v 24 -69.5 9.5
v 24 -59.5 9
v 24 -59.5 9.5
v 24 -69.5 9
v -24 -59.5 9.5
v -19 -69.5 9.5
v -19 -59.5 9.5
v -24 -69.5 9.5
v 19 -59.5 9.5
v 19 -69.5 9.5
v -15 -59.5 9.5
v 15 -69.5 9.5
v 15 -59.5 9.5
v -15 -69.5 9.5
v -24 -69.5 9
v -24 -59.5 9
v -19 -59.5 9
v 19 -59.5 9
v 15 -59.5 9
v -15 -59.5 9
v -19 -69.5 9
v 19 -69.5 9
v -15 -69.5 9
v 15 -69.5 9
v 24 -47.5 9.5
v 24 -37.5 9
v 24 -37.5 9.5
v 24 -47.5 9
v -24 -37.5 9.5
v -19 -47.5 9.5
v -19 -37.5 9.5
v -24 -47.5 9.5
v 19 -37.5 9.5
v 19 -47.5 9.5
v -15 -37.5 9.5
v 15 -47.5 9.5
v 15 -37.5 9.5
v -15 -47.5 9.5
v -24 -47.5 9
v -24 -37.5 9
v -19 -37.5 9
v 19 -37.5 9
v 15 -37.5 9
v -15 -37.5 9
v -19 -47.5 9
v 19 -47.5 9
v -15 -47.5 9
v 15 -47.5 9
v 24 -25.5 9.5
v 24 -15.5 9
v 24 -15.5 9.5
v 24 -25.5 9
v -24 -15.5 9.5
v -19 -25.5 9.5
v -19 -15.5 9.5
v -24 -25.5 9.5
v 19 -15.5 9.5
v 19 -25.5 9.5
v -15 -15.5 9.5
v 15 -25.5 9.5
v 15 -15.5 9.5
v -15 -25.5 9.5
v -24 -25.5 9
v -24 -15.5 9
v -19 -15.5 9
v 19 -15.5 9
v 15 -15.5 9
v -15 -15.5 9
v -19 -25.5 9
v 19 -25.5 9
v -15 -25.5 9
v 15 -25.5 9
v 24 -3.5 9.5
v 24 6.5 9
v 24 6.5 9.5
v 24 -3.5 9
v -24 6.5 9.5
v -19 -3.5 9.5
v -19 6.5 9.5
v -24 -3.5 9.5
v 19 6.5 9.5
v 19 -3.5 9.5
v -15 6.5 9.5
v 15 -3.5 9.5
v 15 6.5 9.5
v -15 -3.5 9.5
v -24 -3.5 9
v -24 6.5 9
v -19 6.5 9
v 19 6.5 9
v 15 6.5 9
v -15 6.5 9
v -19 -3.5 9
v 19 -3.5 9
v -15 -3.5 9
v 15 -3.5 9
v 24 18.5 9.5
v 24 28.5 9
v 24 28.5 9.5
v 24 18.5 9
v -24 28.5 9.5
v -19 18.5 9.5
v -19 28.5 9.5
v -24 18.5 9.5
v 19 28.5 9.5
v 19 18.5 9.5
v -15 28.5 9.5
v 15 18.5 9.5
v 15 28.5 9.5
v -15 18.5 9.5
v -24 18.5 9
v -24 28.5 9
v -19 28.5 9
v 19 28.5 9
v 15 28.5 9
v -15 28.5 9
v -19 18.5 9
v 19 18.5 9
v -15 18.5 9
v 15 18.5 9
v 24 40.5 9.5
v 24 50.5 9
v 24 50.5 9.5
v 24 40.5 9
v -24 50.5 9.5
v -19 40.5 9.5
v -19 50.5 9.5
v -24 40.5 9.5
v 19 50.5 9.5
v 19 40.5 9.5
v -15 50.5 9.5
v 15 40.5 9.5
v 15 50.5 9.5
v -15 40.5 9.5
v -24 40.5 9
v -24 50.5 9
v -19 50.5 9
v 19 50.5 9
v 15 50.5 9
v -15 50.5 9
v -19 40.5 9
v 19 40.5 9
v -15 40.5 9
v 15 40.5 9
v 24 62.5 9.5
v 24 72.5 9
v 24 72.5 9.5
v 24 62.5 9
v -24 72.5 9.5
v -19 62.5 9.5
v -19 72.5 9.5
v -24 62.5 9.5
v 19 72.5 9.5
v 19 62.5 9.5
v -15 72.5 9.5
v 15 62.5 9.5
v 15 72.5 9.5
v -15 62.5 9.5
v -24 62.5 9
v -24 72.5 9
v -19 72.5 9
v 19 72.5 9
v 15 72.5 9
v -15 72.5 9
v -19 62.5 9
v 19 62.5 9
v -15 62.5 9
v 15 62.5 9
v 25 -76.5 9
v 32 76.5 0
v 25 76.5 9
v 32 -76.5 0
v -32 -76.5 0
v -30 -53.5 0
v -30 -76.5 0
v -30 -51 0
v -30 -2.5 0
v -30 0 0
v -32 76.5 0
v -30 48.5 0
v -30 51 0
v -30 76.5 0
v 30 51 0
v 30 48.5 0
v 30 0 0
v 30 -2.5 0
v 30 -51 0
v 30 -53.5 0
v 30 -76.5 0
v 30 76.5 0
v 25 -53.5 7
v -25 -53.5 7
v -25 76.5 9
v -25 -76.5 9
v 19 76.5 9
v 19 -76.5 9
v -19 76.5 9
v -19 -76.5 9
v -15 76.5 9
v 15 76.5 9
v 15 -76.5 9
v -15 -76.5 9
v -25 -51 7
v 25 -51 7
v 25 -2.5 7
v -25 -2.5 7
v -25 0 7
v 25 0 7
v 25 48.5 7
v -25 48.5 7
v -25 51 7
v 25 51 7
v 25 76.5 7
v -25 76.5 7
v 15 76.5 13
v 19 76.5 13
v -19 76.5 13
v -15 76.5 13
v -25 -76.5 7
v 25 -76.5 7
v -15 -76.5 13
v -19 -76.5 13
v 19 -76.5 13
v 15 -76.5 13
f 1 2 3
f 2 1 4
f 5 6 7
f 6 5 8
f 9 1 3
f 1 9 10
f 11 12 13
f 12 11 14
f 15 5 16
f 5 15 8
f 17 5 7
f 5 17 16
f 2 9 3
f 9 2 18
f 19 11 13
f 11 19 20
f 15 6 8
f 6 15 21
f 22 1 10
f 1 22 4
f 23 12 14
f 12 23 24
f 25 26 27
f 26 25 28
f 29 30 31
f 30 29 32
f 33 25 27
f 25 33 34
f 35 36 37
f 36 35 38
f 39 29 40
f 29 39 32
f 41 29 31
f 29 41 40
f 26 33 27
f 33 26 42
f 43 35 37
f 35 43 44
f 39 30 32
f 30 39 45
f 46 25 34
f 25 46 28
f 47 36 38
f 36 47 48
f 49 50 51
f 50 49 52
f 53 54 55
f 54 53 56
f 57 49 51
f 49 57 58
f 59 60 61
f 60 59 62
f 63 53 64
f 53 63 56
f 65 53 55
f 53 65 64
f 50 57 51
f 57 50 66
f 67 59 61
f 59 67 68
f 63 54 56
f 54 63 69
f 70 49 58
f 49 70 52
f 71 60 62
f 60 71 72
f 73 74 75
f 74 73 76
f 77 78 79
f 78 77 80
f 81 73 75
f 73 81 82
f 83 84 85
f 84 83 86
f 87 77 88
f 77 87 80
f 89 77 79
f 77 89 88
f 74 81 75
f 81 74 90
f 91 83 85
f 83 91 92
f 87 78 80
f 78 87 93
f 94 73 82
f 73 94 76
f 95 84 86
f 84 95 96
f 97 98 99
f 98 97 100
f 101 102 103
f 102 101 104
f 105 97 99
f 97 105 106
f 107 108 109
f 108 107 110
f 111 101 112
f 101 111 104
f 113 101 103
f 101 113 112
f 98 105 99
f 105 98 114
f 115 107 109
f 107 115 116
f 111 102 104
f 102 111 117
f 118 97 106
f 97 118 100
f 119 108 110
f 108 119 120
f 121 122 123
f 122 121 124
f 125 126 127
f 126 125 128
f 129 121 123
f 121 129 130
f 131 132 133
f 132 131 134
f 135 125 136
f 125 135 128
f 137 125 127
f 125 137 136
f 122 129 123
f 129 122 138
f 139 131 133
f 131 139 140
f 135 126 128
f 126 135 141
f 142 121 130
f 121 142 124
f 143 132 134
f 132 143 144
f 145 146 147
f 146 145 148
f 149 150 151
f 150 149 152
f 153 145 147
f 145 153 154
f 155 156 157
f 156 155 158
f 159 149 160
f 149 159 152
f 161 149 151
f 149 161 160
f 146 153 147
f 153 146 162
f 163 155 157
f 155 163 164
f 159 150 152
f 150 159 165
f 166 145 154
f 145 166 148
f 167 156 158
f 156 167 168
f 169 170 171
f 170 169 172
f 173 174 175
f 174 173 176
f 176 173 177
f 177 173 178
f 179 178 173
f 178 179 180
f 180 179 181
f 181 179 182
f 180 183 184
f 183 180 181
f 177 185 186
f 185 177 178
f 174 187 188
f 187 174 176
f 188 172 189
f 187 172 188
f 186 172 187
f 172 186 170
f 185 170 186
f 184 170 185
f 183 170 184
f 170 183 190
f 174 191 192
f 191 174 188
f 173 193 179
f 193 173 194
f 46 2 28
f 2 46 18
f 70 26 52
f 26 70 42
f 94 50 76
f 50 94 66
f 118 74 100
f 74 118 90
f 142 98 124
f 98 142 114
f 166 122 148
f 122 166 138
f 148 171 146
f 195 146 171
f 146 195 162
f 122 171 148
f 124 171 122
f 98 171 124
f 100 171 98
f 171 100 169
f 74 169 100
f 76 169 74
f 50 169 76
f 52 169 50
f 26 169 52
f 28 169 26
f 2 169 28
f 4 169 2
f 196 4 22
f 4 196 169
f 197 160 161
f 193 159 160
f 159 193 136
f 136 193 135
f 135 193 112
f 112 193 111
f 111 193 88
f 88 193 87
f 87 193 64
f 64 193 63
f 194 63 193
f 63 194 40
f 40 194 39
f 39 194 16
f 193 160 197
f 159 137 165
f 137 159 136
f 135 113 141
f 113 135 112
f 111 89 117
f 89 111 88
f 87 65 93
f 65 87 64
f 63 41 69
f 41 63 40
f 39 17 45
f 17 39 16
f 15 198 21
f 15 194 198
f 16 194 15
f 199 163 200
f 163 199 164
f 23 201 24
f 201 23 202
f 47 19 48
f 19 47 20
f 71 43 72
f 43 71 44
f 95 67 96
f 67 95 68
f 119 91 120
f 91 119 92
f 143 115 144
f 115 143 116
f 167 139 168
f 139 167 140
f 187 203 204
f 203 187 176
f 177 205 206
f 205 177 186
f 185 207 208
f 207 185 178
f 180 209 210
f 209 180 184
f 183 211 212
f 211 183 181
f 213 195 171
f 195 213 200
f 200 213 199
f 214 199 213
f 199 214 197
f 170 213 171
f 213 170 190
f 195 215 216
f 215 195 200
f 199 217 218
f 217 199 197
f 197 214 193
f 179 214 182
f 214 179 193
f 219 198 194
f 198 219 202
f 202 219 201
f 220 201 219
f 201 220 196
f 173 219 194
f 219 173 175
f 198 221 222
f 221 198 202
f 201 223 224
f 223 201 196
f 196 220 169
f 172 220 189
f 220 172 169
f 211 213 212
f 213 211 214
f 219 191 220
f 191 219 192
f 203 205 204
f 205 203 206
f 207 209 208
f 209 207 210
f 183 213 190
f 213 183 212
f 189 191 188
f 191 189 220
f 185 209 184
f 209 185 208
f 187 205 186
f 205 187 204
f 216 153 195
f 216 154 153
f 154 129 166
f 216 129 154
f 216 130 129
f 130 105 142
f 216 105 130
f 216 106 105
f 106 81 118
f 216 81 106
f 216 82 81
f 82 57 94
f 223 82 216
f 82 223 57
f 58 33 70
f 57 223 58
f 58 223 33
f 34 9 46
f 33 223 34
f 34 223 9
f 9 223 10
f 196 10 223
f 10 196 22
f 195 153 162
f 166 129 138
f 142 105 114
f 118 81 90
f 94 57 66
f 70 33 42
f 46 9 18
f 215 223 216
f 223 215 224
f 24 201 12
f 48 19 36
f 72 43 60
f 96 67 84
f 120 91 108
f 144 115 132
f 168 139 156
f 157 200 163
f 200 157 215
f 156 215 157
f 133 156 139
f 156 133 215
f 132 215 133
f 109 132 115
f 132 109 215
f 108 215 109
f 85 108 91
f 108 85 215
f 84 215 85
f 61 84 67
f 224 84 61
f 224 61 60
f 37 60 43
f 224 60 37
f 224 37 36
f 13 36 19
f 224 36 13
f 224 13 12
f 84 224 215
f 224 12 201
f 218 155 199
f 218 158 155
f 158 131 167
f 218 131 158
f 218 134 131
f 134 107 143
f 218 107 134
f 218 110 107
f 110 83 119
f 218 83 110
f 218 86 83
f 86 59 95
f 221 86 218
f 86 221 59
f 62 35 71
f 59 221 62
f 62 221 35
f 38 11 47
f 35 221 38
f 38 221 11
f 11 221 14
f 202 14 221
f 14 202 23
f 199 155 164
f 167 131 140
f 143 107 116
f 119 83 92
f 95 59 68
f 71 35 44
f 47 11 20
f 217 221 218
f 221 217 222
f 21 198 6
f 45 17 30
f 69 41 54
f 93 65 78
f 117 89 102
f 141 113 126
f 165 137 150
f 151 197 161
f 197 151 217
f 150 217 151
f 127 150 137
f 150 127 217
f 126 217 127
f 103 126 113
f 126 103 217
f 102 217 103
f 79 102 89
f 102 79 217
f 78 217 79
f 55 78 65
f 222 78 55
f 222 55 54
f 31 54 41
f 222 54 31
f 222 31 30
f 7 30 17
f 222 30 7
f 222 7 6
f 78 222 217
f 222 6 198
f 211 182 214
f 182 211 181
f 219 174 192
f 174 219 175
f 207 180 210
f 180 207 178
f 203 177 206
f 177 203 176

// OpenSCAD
//
// Curved track, made to be compatible with Geotrax®
// (Work in progress : no join system between tracks)
// Author: Francois Crevola (francois@crevola.org)
//

long = 153;

// main piece
	rotate([90,0,0])
	translate([0, 0, -long/2]) // center
	linear_extrude(height=long)
		polygon(points=[[0,7],[-25,7],[-30,0],[-32,0],[-25,9],[-19,9],[-19,13],[-15,13],[-15,9],[15,9],[15,13],[19,13],[19,9],[25,9],[32,0],[30,0],[25,7]], paths=[[0,1,2,3,4,5,6,7,8,9,10,11,12,13,14,15,16,17,18,19,20]]);


// + traverses
spacing = 22;
max = 7;
delta = 10;
for (i = [1:max]) // n iterations
{
	translate([0,-long/2+(i*spacing)-delta,9])
	cube(size = [48, 10, 1], center = true);
}

// + supports
for (i = [-1, 0, 1]) {
	translate([0,i*(long/3),0])
	rotate([90,0,0])
	linear_extrude(height=2.5)
		polygon(points=[[-32,0],[-25,9],[25,9],[32,0]], paths=[[0,1,2,3,4,5,6,7,8,9,10,11,12,13,14,15,16,17,18,19,20]]);
}
